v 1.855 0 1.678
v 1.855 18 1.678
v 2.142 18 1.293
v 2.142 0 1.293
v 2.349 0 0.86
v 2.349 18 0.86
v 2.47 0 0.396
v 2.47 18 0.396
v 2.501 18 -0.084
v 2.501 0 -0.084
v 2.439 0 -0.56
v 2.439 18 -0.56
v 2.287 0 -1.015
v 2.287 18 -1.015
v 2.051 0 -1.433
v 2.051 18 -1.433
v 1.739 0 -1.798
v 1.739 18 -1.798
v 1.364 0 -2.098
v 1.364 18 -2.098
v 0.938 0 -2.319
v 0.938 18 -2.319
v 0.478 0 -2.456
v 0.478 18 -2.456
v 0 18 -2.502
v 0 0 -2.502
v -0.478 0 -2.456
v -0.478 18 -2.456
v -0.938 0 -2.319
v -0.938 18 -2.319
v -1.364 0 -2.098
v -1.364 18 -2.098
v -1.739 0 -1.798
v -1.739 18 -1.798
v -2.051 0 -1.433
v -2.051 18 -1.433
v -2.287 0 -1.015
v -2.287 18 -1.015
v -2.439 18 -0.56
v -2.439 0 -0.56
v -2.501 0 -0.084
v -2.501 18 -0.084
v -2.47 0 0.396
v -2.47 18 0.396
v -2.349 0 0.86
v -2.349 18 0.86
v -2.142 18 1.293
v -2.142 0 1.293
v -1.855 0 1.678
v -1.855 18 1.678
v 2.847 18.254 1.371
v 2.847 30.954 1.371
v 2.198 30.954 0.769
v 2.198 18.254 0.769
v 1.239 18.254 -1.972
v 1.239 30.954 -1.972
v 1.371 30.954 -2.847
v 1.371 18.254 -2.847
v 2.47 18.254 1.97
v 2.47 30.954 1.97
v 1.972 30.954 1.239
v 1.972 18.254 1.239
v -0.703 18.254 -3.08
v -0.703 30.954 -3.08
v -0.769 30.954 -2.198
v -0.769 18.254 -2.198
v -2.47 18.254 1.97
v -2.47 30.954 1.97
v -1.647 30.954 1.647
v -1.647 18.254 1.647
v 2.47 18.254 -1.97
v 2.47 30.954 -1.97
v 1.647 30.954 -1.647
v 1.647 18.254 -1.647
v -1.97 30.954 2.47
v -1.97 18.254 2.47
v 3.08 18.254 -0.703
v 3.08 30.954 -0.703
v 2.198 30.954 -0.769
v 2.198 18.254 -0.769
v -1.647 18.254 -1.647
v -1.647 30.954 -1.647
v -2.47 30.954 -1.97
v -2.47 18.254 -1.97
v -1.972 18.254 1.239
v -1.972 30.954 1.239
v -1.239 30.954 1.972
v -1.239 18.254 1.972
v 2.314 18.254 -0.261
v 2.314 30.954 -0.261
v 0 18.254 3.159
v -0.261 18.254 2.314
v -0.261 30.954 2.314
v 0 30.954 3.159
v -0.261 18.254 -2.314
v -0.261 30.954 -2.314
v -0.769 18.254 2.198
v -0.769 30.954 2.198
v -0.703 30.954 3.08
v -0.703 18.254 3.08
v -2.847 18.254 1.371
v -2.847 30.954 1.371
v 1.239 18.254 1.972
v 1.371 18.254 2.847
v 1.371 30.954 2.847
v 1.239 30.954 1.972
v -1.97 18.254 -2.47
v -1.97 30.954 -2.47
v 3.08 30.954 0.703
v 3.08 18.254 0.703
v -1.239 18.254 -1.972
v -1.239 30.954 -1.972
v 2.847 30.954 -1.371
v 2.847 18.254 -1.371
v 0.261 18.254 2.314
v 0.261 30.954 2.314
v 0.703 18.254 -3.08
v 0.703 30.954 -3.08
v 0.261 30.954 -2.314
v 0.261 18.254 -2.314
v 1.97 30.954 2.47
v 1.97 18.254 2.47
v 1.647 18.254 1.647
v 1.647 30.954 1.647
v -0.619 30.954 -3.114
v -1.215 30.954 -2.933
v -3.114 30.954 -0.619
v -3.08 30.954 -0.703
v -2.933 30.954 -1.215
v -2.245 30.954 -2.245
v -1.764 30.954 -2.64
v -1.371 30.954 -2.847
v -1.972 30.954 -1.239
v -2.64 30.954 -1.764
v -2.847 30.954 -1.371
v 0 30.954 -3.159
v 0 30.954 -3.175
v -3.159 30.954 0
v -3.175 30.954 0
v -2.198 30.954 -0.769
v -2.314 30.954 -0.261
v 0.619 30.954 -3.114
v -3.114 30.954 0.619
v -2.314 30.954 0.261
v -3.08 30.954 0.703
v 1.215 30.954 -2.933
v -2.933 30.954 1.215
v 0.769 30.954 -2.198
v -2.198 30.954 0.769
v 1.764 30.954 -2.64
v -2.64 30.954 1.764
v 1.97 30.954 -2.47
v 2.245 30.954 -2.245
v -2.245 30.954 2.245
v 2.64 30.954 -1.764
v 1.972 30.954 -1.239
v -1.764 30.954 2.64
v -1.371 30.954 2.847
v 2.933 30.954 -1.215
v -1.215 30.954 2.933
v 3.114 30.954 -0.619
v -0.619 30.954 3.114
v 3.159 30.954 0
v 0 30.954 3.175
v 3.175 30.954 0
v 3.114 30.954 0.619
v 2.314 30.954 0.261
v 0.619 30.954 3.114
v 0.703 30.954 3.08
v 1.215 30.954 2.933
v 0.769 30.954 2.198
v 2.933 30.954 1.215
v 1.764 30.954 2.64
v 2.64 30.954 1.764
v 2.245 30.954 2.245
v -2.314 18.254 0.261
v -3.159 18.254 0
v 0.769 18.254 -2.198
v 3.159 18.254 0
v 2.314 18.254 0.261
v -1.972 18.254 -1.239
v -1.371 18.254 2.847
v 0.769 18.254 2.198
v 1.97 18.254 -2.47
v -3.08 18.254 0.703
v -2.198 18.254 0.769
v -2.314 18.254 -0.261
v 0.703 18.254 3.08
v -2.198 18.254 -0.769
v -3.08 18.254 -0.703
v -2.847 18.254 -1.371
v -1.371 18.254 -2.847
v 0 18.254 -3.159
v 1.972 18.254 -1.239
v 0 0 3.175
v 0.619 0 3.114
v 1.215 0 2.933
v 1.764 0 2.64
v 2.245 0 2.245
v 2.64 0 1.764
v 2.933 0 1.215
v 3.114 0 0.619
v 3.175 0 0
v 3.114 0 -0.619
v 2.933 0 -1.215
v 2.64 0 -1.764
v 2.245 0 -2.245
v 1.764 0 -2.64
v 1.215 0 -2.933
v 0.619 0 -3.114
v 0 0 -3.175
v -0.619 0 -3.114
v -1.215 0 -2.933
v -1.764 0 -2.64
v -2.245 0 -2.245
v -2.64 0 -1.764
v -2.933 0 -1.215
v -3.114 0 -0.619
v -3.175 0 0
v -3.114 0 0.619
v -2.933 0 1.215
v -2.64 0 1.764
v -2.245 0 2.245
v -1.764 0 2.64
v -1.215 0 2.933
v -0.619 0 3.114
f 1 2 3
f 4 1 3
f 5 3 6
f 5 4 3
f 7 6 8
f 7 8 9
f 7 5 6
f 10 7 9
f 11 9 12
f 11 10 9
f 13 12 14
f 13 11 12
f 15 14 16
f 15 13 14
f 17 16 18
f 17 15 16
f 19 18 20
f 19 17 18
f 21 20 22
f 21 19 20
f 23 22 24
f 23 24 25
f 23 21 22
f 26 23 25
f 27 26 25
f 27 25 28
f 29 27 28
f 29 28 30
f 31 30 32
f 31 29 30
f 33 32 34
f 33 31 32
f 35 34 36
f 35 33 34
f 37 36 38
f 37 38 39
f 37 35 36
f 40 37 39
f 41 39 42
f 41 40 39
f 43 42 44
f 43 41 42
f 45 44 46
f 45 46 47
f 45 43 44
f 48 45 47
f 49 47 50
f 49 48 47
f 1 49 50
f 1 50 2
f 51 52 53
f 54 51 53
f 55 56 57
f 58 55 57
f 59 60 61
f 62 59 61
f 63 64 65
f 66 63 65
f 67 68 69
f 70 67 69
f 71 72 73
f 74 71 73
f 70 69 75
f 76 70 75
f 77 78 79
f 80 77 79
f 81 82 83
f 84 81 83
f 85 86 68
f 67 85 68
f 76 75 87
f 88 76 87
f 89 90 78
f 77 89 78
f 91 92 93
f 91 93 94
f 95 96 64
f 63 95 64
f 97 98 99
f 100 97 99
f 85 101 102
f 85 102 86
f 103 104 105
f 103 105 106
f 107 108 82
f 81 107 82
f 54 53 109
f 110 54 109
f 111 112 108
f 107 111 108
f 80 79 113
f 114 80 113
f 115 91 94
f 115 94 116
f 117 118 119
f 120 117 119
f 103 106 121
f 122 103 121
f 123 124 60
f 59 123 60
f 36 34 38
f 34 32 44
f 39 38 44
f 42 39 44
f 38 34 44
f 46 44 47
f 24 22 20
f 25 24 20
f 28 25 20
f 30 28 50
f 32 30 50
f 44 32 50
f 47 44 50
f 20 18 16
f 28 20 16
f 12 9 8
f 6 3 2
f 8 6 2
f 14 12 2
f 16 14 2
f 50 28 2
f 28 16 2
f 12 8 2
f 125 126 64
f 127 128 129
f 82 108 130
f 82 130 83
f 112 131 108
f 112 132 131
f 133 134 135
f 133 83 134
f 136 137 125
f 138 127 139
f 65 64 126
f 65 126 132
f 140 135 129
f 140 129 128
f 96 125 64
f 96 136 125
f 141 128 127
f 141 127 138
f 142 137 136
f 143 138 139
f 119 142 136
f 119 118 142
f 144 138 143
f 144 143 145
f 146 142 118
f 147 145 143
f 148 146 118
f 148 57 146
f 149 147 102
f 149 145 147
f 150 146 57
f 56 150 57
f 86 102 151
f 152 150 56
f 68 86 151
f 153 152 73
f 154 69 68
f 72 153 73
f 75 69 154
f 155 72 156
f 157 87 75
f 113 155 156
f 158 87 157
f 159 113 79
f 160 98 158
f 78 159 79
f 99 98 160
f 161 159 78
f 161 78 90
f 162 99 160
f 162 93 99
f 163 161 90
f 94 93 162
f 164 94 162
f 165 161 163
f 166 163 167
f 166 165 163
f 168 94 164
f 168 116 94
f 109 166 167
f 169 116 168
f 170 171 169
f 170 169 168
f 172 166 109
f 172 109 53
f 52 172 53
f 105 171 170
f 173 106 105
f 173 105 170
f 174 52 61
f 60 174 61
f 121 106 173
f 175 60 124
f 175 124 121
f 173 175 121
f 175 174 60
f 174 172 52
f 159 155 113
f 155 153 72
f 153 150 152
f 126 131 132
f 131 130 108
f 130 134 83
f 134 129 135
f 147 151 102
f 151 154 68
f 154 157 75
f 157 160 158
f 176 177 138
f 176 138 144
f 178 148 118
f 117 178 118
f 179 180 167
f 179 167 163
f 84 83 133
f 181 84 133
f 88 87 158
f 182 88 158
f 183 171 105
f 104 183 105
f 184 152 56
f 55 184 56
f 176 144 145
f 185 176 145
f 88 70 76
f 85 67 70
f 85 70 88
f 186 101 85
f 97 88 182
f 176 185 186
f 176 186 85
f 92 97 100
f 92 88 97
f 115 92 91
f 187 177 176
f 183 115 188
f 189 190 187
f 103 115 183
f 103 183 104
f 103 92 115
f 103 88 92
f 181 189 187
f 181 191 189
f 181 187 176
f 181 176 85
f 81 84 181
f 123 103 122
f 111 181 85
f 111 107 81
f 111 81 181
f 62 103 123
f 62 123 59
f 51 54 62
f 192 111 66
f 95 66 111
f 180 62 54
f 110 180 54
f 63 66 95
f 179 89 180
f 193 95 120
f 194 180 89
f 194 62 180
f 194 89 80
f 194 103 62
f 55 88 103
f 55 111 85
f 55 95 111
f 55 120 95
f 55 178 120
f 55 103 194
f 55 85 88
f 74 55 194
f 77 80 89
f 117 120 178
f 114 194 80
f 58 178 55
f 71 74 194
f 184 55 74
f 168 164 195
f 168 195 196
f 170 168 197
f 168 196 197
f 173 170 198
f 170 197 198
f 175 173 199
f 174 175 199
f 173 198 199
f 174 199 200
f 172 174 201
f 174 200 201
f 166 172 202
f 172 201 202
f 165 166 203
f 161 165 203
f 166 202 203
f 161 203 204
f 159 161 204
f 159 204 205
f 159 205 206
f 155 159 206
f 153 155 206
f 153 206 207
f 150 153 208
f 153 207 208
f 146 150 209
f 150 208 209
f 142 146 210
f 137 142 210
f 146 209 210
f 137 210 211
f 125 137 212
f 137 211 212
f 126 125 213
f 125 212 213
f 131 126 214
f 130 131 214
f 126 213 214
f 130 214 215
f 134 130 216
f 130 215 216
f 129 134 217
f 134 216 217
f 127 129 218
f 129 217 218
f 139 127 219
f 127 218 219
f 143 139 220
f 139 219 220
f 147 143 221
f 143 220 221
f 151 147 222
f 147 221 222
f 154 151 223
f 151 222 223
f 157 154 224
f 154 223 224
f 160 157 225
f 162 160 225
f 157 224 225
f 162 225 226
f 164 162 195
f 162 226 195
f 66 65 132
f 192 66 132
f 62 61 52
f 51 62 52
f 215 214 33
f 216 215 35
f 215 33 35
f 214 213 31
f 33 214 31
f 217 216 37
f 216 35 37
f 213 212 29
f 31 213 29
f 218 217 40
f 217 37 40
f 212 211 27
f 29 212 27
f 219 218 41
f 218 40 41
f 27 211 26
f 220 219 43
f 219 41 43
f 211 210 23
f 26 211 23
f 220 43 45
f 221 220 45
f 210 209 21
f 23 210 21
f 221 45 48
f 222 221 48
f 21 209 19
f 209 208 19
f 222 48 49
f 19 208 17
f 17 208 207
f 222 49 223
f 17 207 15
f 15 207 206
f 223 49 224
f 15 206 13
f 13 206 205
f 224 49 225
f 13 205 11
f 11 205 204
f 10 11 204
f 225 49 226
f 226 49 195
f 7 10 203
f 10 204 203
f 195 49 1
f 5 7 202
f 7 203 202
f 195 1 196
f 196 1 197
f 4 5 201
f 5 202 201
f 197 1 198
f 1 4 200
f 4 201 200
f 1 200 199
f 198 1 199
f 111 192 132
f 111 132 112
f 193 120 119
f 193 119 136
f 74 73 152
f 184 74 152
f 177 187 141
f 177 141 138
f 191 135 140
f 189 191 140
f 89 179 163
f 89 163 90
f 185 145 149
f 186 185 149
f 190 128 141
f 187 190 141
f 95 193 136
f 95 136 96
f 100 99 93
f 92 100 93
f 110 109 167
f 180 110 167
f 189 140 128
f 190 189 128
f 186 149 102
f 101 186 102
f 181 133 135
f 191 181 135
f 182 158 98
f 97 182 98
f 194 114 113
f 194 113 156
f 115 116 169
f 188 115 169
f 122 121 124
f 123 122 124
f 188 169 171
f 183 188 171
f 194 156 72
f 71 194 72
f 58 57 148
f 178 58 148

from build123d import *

# Parameters (mm, degrees)
SKETCH1_R           = 3.175
BOSS_EXTRUDE1_DEPTH = 18.000000068
SKETCH2_R           = 3.175
BOSS_EXTRUDE2_DEPTH = 0.254
SKETCH4_R           = 3.175
BOSS_EXTRUDE3_DEPTH = 12.7
CUT_EXTRUDE3_DEPTH  = 12.7


with BuildPart() as part:
    # Sketch1 → Boss-Extrude1 (new body)
    with BuildSketch(Plane(origin=(0, 0, 0), x_dir=(1, 0, 0), z_dir=(0, 1, 0))):
        with Locations(Location((0, 0, 0), (0, 0, 270))):
            Circle(SKETCH1_R)
        with BuildLine():
            Line((-1.855488288, -1.67829283), (1.855488288, -1.67829283))
            ThreePointArc((1.855488288, -1.67829283), (0, 2.5019), (-1.855488288, -1.67829283))
        make_face(mode=Mode.SUBTRACT)
    extrude(amount=BOSS_EXTRUDE1_DEPTH)

    # Sketch2 → Boss-Extrude2 (add)
    with BuildSketch(Plane(origin=(0, 18.000000068, 0), x_dir=(1, 0, 0), z_dir=(0, 1, 0))):
        with Locations(Location((0, 0, 0), (0, 0, 270))):
            Circle(SKETCH2_R)
    extrude(amount=BOSS_EXTRUDE2_DEPTH)

    # Sketch4 → Boss-Extrude3 (add)
    with BuildSketch(Plane(origin=(0, 18.254000068, 0), x_dir=(1, 0, 0), z_dir=(0, 1, 0))):
        with Locations(Location((0, 0, 0), (0, 0, 270))):
            Circle(SKETCH4_R)
    extrude(amount=BOSS_EXTRUDE3_DEPTH)

    # Sketch5 → Cut-Extrude3 (cut)
    with BuildSketch(Plane(origin=(0, 30.954000068, 0), x_dir=(1, 0, 0), z_dir=(0, 1, 0))):
        Polygon((0.703027733, 3.08016575), (0.260735719, 2.314093511), (0, 3.159377952), (-0.260735719, 2.314093511), (-0.703027733, 3.08016575), (-0.76913278, 2.1980552), (-1.370802719, 2.846501177), (-1.238962311, 1.971797222), (-1.969839933, 2.470101148), (-1.646665099, 1.646665099), (-2.470101148, 1.969839933), (-1.971797222, 1.238962311), (-2.846501177, 1.370802719), (-2.1980552, 0.76913278), (-3.08016575, 0.703027733), (-2.314093511, 0.260735719), (-3.159377952, 0), (-2.314093511, -0.260735719), (-3.08016575, -0.703027733), (-2.1980552, -0.76913278), (-2.846501177, -1.370802719), (-1.971797222, -1.238962311), (-2.470101148, -1.969839933), (-1.646665099, -1.646665099), (-1.969839933, -2.470101148), (-1.238962311, -1.971797222), (-1.370802719, -2.846501177), (-0.76913278, -2.1980552), (-0.703027733, -3.08016575), (-0.260735719, -2.314093511), (0, -3.159377952), (0.260735719, -2.314093511), (0.703027733, -3.08016575), (0.76913278, -2.1980552), (1.370802719, -2.846501177), (1.238962311, -1.971797222), (1.969839933, -2.470101148), (1.646665099, -1.646665099), (2.470101148, -1.969839933), (1.971797222, -1.238962311), (2.846501177, -1.370802719), (2.1980552, -0.76913278), (3.08016575, -0.703027733), (2.314093511, -0.260735719), (3.159377952, 0), (2.314093511, 0.260735719), (3.08016575, 0.703027733), (2.1980552, 0.76913278), (2.846501177, 1.370802719), (1.971797222, 1.238962311), (2.470101148, 1.969839933), (1.646665099, 1.646665099), (1.969839933, 2.470101148), (1.238962311, 1.971797222), (1.370802719, 2.846501177), (0.76913278, 2.1980552), align=None)
    extrude(amount=-CUT_EXTRUDE3_DEPTH, mode=Mode.SUBTRACT)


solid = part.part
